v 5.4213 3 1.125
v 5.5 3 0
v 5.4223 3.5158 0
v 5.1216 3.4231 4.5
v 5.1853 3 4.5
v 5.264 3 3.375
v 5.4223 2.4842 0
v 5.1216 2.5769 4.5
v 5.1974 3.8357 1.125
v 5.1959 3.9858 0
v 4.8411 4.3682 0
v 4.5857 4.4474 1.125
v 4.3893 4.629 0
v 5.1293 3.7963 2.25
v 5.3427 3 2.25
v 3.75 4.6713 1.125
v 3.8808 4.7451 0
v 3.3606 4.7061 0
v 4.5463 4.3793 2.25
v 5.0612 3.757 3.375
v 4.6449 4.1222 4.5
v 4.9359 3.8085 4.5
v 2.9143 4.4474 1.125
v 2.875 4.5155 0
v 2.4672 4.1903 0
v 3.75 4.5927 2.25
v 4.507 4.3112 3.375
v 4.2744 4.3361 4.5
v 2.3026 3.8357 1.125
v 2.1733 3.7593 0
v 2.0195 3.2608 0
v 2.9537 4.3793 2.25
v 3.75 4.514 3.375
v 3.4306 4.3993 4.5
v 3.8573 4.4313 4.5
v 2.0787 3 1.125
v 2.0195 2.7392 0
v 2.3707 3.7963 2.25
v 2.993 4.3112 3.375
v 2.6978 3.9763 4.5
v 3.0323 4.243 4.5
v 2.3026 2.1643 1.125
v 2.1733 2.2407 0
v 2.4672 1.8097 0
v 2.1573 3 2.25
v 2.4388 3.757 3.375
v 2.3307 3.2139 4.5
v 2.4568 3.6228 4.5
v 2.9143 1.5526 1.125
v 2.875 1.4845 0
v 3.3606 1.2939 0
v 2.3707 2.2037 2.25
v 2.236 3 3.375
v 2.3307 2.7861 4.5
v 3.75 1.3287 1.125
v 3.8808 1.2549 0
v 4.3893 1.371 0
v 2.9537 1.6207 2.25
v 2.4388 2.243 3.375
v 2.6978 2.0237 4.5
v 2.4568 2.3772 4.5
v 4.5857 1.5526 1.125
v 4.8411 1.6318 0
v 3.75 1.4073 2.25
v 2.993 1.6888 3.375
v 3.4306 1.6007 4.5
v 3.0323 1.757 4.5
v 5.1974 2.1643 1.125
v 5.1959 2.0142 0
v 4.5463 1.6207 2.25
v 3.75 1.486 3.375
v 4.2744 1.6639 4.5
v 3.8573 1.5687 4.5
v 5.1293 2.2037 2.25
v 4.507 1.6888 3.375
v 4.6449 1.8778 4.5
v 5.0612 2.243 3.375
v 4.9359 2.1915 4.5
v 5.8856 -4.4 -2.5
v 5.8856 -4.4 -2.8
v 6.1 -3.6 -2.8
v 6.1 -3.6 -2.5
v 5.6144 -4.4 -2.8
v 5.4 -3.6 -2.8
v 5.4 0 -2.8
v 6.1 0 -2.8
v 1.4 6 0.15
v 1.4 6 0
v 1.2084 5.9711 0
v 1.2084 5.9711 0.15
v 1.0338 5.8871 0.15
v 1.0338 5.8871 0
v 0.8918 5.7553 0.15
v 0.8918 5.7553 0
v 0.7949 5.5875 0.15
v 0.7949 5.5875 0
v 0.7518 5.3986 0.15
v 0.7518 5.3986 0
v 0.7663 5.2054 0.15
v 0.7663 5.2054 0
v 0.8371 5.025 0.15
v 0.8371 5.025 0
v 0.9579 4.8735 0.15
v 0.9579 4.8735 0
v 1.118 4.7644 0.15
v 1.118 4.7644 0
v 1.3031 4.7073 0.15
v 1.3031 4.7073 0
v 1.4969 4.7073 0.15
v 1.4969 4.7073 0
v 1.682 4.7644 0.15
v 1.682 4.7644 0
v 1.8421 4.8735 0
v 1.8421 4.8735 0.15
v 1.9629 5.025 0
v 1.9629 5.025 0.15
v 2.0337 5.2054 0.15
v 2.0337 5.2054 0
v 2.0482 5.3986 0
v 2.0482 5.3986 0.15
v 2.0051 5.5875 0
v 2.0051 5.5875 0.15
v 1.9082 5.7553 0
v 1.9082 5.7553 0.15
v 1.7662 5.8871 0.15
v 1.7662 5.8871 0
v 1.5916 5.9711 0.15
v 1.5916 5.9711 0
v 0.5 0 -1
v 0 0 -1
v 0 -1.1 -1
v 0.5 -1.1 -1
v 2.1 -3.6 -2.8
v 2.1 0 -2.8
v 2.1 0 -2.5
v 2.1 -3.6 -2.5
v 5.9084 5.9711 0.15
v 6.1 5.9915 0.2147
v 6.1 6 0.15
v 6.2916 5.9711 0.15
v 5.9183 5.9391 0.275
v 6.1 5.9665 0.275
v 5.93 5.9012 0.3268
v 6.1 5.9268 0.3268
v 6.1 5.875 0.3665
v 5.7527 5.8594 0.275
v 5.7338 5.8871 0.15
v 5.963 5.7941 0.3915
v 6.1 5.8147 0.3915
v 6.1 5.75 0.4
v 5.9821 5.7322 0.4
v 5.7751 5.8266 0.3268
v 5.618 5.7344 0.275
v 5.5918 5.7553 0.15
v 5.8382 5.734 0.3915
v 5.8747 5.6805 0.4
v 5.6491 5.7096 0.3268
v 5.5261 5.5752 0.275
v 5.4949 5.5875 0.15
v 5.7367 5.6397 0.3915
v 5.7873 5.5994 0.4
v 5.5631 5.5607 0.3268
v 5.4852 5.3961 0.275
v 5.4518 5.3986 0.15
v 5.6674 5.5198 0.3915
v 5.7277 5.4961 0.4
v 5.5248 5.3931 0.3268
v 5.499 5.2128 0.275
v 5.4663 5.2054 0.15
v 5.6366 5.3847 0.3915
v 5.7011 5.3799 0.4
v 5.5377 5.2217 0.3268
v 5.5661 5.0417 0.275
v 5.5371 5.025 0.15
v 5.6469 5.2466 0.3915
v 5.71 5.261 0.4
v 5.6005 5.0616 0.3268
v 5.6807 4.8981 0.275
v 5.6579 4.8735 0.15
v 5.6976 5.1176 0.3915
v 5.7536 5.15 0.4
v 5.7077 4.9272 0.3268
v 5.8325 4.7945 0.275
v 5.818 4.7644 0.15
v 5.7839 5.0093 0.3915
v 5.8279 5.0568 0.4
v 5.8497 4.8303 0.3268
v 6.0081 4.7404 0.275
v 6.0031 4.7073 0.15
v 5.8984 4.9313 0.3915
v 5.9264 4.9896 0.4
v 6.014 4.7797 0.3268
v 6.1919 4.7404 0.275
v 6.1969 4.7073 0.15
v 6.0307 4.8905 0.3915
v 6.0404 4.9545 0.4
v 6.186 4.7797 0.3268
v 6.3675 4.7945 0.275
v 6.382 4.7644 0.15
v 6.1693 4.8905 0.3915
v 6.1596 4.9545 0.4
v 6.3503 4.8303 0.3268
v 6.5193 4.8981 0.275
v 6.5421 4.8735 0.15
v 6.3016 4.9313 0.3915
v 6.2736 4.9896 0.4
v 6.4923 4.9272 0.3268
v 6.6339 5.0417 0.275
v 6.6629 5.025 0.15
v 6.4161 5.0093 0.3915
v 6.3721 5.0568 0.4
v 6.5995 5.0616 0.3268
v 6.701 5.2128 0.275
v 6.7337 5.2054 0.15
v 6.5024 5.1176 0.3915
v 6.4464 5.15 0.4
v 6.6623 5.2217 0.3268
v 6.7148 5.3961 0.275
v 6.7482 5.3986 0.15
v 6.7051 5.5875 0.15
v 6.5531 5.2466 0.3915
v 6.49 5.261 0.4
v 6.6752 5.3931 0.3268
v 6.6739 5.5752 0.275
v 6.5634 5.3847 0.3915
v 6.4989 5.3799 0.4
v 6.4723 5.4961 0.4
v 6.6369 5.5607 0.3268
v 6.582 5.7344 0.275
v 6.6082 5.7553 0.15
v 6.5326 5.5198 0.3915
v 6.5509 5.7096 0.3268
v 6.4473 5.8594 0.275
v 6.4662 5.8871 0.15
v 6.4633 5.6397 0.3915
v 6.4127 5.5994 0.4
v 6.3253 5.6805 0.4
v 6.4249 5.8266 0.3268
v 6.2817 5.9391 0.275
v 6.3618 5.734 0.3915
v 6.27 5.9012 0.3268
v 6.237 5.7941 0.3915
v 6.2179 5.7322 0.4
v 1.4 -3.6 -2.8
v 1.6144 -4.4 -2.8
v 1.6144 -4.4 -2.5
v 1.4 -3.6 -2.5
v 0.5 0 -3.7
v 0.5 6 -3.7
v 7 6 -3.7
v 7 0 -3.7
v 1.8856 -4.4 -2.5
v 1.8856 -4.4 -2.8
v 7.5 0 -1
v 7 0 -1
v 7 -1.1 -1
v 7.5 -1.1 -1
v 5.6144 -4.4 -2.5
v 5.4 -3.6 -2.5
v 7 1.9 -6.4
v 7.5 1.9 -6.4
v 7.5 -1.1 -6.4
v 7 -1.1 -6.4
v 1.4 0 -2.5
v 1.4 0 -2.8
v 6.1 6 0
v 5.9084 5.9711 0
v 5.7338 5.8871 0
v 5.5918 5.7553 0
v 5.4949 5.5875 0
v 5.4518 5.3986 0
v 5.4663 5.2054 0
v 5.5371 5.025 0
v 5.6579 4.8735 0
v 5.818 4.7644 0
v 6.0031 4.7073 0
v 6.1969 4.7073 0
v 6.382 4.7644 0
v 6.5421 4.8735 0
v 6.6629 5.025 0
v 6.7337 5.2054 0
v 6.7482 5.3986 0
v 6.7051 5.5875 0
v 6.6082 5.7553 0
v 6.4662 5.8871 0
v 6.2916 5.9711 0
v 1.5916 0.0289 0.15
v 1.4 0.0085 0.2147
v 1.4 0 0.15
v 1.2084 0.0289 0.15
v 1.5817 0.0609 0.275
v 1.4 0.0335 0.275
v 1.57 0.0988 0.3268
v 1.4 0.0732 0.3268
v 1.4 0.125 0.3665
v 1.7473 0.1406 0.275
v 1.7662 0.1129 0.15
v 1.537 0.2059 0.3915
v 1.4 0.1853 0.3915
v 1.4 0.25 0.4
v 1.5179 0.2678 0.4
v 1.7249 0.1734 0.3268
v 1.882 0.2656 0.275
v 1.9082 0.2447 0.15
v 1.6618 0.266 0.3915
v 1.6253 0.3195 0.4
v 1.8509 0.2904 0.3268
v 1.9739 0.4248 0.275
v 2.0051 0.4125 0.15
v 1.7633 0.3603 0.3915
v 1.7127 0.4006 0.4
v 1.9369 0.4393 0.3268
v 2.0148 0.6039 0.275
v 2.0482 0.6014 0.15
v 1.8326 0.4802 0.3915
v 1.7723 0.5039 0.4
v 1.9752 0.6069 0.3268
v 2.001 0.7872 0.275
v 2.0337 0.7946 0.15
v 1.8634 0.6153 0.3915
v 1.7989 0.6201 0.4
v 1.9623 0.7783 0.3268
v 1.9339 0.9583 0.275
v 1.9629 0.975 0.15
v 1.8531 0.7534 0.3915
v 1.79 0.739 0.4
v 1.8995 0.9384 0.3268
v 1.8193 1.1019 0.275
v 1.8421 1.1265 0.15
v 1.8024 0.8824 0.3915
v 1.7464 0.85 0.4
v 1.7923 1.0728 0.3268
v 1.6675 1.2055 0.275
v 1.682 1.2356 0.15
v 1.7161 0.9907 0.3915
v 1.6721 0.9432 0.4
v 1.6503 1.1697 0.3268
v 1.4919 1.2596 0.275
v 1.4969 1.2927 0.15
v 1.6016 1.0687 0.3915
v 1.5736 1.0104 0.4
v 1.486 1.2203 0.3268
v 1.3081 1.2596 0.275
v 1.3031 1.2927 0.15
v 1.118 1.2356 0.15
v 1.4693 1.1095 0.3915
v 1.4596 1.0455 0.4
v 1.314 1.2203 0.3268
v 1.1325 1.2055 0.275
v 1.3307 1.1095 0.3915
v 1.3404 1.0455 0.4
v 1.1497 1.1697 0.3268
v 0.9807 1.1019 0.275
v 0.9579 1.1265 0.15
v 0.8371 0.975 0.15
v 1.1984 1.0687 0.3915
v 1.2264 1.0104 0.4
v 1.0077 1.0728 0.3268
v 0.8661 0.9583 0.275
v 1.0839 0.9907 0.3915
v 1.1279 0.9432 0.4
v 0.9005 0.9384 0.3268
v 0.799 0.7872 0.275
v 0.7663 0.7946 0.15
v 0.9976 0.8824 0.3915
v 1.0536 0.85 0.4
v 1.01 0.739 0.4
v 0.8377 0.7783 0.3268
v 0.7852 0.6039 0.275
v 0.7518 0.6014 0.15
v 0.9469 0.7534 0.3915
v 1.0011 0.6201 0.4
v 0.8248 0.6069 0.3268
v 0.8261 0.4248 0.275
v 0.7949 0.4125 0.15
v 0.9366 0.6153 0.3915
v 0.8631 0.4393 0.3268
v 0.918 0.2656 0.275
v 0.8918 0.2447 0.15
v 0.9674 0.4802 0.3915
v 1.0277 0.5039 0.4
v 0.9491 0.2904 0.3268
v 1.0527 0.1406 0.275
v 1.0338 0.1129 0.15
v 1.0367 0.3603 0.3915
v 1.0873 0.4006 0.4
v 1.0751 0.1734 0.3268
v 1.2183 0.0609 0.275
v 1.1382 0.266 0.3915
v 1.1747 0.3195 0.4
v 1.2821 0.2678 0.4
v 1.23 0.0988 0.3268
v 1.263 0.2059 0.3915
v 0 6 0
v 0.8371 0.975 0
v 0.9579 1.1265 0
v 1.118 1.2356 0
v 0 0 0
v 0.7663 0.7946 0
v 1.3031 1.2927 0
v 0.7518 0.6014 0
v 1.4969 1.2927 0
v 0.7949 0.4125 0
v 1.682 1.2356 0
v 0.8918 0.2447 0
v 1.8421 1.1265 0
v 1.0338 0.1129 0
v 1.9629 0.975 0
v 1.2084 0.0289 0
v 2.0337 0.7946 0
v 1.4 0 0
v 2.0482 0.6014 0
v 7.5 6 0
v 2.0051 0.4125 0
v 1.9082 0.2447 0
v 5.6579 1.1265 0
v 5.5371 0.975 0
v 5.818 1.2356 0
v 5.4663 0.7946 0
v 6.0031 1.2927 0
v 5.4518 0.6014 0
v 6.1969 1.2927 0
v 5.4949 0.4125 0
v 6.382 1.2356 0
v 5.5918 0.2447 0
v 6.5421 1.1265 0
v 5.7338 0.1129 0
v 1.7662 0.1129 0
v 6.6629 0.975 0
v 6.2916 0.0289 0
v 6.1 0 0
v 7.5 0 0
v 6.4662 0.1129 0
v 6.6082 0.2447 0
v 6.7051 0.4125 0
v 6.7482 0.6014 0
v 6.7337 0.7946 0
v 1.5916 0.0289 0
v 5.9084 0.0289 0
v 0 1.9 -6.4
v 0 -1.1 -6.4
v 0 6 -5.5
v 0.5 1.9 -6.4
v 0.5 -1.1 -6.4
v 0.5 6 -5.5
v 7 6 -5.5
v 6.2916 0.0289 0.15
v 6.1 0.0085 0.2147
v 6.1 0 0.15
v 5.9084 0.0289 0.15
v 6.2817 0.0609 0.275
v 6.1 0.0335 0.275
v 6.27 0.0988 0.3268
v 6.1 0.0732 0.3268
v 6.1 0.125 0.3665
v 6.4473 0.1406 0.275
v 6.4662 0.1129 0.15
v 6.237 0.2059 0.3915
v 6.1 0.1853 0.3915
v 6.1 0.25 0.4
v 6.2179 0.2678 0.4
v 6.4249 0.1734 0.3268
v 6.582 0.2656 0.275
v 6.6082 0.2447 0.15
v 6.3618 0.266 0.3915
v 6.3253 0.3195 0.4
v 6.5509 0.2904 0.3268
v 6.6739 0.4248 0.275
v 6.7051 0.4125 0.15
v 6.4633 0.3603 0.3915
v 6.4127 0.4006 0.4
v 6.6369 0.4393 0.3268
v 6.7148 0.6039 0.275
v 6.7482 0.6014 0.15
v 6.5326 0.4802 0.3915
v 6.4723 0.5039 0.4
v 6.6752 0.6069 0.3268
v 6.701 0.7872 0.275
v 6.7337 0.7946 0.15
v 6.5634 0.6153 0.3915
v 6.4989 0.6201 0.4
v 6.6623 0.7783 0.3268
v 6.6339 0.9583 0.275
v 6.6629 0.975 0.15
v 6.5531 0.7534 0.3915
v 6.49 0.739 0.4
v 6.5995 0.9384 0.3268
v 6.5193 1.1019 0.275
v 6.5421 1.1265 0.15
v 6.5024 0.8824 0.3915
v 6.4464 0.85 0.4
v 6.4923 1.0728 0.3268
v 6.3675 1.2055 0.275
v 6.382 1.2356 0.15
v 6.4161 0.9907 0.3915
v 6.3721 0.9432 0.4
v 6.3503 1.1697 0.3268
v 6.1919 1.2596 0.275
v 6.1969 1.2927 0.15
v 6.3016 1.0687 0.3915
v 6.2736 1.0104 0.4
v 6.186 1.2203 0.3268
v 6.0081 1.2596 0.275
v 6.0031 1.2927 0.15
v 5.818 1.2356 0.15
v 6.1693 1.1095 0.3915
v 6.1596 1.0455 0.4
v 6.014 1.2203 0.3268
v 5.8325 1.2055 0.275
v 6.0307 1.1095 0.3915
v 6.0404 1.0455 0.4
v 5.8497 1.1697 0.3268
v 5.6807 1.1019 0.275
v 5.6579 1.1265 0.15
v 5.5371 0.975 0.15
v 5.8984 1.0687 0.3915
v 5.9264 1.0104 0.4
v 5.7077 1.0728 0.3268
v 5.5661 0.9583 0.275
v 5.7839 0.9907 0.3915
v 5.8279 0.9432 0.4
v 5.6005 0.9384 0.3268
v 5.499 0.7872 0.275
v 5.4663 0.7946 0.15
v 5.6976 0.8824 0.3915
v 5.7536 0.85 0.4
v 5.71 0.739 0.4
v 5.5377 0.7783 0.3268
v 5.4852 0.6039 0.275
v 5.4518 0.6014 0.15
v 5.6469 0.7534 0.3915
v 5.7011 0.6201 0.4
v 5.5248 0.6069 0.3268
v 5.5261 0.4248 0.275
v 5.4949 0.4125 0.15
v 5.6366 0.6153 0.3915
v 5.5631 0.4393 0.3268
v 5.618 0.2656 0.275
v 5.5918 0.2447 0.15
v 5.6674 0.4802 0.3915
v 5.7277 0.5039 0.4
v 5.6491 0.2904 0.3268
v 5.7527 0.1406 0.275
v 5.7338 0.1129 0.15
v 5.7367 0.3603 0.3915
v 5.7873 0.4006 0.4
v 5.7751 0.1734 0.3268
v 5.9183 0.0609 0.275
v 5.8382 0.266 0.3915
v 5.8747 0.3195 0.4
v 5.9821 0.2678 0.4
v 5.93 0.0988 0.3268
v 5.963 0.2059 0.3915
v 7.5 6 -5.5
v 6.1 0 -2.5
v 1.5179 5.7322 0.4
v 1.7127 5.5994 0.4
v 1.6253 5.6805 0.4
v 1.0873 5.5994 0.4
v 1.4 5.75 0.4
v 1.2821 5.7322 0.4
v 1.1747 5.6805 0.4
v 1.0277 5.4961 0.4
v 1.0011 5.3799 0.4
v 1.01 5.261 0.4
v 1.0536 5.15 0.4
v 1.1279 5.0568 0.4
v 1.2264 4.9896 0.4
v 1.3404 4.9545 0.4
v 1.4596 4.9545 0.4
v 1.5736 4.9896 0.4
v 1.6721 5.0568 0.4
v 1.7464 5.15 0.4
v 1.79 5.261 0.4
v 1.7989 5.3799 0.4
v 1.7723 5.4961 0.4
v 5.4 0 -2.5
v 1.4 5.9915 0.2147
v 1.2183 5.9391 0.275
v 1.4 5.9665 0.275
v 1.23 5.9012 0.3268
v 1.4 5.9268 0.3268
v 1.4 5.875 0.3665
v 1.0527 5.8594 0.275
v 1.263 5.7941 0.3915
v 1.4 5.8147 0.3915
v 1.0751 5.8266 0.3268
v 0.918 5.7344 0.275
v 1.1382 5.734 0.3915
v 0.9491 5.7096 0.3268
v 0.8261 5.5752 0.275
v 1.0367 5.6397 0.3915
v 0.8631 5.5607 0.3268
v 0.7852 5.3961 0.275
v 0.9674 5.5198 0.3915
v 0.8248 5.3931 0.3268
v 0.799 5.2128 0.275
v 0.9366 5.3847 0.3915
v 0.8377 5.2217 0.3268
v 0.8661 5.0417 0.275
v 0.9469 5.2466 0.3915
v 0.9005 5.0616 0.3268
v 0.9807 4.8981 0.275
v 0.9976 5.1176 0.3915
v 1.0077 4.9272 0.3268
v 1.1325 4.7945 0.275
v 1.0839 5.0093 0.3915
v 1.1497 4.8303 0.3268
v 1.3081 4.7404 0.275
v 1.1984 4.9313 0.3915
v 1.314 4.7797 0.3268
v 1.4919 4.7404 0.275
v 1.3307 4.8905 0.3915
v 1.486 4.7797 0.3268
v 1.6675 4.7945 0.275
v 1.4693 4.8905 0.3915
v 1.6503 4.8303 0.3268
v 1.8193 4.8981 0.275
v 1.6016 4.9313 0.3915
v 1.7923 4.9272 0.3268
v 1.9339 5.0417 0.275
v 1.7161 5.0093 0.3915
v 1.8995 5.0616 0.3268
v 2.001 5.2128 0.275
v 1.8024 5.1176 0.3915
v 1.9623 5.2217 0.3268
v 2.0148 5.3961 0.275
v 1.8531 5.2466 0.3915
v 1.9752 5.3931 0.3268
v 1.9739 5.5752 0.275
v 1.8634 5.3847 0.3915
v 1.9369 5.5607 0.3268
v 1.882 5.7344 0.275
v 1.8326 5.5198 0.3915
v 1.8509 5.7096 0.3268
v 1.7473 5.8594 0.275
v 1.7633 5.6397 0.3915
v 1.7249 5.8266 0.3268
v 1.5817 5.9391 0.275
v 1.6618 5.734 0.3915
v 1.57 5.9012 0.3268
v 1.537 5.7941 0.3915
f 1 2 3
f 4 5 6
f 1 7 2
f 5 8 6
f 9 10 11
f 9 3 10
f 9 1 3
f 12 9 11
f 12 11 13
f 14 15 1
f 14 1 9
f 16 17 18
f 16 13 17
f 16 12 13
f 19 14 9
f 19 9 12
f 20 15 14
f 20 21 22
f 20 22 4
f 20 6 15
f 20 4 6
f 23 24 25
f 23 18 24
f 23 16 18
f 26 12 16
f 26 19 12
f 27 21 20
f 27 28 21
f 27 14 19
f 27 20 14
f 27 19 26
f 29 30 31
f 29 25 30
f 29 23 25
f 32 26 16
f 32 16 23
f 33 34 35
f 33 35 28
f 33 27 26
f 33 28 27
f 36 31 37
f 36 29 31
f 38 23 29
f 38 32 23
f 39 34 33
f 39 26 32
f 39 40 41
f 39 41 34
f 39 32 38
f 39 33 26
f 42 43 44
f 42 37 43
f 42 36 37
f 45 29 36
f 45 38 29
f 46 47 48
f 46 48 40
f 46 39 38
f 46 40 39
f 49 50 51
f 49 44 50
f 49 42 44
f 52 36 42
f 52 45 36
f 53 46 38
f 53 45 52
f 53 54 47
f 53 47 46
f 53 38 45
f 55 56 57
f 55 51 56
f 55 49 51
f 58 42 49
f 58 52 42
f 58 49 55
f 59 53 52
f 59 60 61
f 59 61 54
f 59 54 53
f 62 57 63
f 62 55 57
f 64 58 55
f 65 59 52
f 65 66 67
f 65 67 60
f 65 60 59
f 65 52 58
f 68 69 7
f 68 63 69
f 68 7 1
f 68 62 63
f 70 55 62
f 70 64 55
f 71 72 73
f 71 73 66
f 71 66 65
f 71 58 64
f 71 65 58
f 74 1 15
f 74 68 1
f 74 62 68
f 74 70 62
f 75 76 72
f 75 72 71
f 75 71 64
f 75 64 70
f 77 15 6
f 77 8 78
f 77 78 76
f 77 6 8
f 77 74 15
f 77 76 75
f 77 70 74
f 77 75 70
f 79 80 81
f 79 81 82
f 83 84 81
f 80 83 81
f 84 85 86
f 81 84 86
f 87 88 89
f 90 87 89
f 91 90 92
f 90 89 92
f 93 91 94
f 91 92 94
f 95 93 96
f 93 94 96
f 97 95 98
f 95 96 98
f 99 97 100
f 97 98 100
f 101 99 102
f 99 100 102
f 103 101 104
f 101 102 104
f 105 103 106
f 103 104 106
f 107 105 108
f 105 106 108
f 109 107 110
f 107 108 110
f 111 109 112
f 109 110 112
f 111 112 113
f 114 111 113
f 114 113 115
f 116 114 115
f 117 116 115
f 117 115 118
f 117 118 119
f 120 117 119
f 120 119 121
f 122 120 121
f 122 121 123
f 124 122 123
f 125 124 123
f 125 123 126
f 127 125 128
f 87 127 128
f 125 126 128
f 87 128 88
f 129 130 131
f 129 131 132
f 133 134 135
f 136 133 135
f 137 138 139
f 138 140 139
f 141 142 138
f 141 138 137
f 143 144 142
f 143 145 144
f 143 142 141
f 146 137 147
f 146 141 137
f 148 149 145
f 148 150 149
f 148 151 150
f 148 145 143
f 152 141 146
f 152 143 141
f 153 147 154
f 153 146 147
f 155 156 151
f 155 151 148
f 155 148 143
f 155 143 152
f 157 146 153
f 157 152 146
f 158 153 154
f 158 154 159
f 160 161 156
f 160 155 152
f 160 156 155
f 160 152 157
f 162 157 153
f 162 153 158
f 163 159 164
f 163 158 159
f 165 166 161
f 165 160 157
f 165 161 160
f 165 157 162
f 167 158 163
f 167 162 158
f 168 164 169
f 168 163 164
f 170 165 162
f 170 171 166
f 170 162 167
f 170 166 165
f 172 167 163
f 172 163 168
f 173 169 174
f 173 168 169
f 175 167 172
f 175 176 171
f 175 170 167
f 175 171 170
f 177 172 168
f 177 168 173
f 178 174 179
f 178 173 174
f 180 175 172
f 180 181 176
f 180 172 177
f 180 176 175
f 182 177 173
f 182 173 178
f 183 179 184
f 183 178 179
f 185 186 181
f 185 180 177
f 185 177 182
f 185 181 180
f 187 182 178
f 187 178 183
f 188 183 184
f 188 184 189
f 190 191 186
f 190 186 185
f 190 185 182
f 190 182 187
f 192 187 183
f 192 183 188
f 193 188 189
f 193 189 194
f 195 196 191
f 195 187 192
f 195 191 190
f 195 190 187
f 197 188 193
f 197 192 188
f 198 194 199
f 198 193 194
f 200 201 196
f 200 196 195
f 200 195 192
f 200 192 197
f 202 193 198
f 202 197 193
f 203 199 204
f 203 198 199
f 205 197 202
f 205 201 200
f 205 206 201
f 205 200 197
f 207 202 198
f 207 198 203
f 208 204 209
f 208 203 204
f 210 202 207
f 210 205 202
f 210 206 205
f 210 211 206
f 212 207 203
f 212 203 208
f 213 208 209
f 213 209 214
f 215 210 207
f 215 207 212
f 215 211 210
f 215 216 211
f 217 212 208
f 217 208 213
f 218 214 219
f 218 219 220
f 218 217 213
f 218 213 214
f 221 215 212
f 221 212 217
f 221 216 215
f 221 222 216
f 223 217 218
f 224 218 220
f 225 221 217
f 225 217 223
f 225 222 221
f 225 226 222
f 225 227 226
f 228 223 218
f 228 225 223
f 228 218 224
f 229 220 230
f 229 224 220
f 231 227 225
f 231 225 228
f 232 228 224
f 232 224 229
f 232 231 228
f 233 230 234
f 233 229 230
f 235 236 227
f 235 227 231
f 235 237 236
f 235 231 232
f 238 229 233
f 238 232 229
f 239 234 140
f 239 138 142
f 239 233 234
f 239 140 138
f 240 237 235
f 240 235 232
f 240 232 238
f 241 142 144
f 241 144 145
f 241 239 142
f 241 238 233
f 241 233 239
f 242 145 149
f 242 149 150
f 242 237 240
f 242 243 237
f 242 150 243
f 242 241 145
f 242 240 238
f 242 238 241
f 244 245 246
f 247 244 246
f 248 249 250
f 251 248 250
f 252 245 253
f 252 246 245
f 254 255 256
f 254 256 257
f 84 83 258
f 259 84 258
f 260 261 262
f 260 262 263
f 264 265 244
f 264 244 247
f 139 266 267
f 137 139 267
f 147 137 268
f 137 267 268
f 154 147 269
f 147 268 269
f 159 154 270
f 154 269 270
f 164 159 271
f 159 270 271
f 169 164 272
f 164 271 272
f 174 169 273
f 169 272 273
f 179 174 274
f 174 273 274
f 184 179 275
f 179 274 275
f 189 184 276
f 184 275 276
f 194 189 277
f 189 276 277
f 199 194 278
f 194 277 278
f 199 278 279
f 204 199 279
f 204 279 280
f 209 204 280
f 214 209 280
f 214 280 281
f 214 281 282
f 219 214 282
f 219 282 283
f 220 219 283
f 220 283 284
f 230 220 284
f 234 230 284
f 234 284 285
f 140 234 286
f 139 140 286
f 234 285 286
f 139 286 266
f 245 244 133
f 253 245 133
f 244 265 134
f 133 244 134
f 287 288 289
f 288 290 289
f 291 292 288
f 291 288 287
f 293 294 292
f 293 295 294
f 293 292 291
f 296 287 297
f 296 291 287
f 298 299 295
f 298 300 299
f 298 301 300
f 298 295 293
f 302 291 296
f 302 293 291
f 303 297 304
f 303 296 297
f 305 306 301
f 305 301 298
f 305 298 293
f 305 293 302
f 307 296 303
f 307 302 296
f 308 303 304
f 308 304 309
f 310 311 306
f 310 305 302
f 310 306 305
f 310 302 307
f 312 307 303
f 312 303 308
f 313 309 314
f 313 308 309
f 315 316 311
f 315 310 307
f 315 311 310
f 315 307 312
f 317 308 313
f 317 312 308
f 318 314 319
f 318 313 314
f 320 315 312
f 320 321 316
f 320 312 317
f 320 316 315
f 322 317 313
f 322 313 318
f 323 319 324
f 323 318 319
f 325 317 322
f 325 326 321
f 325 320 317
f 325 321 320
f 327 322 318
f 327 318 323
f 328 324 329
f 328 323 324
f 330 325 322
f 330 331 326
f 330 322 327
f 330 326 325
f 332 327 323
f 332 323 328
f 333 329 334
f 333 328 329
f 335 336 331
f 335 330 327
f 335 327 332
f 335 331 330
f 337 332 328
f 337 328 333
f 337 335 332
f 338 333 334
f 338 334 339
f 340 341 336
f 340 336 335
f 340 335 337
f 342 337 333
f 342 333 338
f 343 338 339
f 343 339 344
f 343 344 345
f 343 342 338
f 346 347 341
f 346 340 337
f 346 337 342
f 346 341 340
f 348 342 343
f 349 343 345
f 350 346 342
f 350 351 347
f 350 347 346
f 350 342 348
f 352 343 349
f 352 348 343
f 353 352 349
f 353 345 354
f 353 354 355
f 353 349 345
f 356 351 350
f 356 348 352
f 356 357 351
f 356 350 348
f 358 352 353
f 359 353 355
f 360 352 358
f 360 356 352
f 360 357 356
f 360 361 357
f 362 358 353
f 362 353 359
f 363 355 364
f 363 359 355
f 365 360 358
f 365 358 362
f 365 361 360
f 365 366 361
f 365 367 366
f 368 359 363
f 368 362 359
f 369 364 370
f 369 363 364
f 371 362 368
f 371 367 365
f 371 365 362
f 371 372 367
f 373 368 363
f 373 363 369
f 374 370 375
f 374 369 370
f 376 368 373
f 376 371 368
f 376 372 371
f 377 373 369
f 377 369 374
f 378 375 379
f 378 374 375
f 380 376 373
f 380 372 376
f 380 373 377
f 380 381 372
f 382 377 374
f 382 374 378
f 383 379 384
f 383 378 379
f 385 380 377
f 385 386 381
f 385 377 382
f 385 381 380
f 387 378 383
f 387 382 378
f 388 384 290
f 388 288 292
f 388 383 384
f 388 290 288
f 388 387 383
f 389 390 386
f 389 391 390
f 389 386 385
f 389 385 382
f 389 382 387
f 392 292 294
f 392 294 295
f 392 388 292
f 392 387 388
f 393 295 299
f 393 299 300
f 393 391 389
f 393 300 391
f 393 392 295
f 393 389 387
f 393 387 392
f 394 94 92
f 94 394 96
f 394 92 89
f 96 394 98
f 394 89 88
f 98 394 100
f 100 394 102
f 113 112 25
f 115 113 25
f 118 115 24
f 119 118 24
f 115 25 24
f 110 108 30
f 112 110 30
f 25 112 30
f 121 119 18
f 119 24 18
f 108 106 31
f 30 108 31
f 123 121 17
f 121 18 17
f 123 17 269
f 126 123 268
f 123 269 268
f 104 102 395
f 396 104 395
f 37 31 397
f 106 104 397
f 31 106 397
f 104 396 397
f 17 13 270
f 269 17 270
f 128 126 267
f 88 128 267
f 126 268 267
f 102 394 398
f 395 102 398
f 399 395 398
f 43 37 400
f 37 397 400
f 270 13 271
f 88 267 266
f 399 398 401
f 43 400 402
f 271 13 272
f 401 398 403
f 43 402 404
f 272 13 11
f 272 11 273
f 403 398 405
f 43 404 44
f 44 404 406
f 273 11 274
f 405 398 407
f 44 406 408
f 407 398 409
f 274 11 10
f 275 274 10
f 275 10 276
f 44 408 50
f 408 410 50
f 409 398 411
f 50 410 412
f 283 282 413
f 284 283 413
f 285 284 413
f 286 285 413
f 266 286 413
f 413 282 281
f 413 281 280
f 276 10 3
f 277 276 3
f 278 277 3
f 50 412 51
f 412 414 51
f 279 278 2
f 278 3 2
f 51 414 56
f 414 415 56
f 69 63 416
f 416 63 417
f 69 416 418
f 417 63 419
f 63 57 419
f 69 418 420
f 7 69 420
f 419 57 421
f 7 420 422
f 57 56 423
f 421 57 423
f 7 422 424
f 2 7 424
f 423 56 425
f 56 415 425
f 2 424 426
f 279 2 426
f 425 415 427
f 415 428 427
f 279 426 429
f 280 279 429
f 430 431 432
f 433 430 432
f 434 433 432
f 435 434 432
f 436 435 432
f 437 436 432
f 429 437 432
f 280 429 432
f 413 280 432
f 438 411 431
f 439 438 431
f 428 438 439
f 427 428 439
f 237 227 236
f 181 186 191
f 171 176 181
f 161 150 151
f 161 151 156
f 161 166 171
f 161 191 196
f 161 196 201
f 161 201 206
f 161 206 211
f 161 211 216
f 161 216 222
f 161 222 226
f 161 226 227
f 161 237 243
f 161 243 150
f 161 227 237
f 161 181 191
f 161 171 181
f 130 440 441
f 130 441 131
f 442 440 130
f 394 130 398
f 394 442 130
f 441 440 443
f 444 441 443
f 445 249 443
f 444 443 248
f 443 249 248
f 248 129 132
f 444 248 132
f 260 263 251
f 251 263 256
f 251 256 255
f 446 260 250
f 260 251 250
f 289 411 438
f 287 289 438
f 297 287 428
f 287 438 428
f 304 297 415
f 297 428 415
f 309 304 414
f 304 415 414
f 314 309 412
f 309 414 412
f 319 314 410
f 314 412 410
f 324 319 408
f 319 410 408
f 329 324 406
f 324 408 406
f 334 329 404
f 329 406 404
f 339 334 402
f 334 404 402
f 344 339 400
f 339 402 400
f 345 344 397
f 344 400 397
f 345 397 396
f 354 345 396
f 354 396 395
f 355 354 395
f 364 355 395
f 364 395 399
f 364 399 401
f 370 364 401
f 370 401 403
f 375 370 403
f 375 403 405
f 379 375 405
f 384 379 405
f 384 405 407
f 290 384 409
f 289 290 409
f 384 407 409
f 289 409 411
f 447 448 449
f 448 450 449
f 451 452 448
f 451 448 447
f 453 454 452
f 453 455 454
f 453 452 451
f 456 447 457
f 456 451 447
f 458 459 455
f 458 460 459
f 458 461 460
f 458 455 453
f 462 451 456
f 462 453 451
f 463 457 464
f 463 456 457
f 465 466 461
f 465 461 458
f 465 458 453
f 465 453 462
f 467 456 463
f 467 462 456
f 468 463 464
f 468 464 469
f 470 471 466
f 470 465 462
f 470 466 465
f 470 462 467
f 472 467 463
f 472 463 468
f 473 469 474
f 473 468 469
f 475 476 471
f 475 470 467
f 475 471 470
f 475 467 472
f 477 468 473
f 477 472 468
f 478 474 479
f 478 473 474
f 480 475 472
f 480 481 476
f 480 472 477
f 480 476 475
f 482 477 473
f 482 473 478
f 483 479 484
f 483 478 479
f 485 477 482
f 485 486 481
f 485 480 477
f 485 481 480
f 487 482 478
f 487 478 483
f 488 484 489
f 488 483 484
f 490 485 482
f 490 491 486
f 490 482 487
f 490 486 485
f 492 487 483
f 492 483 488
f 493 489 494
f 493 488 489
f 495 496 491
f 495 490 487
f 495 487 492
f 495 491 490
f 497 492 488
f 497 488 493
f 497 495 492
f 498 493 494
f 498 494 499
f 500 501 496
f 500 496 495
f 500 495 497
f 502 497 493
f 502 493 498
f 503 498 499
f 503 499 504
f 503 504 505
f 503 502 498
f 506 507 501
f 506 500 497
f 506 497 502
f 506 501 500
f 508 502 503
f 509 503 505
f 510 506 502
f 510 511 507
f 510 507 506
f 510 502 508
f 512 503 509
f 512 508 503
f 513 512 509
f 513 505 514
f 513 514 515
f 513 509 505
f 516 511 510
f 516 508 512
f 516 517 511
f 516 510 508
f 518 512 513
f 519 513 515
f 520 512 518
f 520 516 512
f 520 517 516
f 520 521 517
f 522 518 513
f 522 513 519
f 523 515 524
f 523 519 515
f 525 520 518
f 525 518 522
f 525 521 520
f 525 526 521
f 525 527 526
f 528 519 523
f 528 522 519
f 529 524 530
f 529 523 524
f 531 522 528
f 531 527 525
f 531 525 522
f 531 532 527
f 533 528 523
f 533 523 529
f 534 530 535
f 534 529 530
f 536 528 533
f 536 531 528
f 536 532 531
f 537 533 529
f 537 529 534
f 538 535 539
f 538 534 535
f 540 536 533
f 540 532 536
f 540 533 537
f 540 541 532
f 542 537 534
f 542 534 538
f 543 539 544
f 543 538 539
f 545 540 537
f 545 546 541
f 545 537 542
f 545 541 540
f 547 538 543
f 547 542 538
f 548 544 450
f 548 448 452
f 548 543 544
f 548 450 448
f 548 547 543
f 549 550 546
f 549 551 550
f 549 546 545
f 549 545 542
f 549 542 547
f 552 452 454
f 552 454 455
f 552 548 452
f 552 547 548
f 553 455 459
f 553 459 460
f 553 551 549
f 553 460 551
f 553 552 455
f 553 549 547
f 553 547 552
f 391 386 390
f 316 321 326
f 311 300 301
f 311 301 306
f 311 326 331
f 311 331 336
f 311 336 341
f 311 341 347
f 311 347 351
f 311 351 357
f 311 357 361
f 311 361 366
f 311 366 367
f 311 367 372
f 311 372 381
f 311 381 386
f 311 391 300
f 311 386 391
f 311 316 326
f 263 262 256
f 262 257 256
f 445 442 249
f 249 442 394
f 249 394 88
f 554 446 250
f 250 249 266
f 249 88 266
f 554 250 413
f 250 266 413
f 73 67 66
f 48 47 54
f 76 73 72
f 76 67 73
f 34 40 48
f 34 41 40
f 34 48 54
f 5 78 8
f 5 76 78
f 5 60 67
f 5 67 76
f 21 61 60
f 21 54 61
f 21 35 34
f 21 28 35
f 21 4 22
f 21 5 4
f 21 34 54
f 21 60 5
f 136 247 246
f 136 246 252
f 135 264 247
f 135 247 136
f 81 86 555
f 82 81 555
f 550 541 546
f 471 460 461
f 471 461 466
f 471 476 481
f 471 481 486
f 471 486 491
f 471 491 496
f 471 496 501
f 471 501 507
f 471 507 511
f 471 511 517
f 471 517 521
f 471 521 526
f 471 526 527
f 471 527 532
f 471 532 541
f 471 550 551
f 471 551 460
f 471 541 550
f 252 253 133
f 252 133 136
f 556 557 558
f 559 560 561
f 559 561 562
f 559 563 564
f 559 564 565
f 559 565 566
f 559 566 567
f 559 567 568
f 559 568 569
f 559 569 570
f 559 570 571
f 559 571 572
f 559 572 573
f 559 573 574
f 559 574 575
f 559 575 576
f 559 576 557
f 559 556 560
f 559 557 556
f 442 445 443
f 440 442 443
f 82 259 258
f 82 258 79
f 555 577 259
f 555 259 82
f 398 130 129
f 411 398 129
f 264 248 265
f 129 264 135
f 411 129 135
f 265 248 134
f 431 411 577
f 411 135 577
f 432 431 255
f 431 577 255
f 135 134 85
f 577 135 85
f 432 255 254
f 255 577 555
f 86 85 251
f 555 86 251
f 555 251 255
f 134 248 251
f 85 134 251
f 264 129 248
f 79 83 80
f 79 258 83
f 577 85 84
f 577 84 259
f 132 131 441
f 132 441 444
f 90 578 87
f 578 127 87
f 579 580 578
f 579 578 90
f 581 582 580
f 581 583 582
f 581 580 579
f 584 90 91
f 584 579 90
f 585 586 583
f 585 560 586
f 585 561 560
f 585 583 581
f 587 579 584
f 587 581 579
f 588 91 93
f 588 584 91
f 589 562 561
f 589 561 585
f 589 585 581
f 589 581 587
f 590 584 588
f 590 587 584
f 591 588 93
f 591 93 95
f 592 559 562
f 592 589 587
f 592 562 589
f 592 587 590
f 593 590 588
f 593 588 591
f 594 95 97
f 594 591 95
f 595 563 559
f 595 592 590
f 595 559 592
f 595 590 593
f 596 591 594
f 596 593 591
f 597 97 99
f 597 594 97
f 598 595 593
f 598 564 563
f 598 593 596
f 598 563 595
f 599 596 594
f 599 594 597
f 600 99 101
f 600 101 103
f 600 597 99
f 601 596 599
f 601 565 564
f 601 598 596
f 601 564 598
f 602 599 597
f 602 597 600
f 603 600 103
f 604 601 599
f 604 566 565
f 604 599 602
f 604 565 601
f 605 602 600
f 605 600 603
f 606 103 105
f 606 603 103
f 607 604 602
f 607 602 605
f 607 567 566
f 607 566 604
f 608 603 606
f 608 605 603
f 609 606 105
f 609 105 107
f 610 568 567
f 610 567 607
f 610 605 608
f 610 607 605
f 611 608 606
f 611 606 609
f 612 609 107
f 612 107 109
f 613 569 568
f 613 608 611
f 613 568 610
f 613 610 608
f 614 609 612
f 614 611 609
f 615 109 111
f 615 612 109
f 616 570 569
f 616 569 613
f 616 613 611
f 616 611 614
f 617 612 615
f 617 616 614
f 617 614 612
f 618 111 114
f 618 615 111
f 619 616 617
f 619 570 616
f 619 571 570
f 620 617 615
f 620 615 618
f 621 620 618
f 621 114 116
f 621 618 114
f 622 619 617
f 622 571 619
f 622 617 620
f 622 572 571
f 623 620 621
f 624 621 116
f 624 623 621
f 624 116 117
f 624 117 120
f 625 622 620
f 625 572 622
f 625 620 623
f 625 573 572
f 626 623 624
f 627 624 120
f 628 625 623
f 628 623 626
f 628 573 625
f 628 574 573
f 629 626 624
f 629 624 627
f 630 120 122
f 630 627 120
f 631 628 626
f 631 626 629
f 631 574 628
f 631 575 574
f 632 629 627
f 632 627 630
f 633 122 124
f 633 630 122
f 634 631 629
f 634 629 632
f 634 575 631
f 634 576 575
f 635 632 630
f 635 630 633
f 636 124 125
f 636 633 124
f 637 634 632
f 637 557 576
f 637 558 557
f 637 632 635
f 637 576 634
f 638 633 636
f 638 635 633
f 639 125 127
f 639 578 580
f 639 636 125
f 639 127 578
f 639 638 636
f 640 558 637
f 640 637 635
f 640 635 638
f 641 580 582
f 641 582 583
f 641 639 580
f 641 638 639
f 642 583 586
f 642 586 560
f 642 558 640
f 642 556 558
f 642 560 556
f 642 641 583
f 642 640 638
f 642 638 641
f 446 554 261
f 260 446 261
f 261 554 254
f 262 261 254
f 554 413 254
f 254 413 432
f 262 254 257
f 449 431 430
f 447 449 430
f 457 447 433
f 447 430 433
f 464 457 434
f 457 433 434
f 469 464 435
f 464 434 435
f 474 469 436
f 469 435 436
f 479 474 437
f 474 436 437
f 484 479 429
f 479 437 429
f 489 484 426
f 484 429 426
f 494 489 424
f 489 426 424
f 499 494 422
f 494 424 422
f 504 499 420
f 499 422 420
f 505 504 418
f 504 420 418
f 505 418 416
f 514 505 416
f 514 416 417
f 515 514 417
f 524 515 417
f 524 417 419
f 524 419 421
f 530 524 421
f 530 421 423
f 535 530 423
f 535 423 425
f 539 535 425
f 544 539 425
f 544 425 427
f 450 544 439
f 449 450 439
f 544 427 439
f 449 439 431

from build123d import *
from OCP.BRepFilletAPI import BRepFilletAPI_MakeChamfer

# Parameters (mm, degrees)
SKETCH1_W           = 7.5
SKETCH1_H           = 3.7
BOSS_EXTRUDE1_DEPTH = 6
SKETCH2_R           = 1.75
BOSS_EXTRUDE2_DEPTH = 4.5
BOSS_EXTRUDE2_TAPER = 4
SKETCH3_W           = 0.7
SKETCH3_H           = 0.3
BOSS_EXTRUDE3_DEPTH = 4.4
SKETCH4_W           = 0.5
SKETCH4_H           = 2.7
BOSS_EXTRUDE4_DEPTH = 1.1
BOSS_EXTRUDE5_DEPTH = 2.7
CUT_EXTRUDE1_DEPTH  = 12.541663658
SKETCH7_R           = 0.65
BOSS_EXTRUDE6_DEPTH = 0.4
FILLET1_R           = 0.25
CHAMFER1_SIZE       = 0.8
CHAMFER1_SIZE2      = 0.214359354


with BuildPart() as part:
    # Sketch1 → Boss-Extrude1 (new body)
    with BuildSketch(Plane(origin=(0, 0, 0), x_dir=(1, 0, 0), z_dir=(0, 1, 0))):
        with Locations((3.75, 1.85)):
            Rectangle(SKETCH1_W, SKETCH1_H)
    extrude(amount=BOSS_EXTRUDE1_DEPTH)

    # Sketch2 → Boss-Extrude2 (add)
    with BuildSketch(Plane.XY):
        with Locations((3.75, 3)):
            Circle(SKETCH2_R)
    extrude(amount=BOSS_EXTRUDE2_DEPTH, taper=BOSS_EXTRUDE2_TAPER)

    # Sketch3 → Boss-Extrude3 (add)
    with BuildSketch(Plane.XZ):
        with Locations((1.75, -2.65)):
            Rectangle(SKETCH3_W, SKETCH3_H)
        with Locations((5.75, -2.65)):
            Rectangle(SKETCH3_W, SKETCH3_H)
    extrude(amount=BOSS_EXTRUDE3_DEPTH)

    # Sketch4 → Boss-Extrude4 (add)
    with BuildSketch(Plane.XZ):
        with Locations((0.25, -2.35)):
            Rectangle(SKETCH4_W, SKETCH4_H)
        with Locations((7.25, -2.35)):
            Rectangle(SKETCH4_W, SKETCH4_H)
    extrude(amount=BOSS_EXTRUDE4_DEPTH)

    # Sketch5 → Boss-Extrude5 (add)
    with BuildSketch(Plane(origin=(0, 0, -3.7), x_dir=(-1, 0, 0), z_dir=(0, 0, -1))):
        Polygon((-7, 0), (-7, 6), (-7.5, 6), (-7.5, -1.1), (-7, -1.1), align=None)
        Polygon((-0.5, -1.1), (-0.5, 0), (-0.5, 6), (0, 6), (0, -1.1), align=None)
    extrude(amount=BOSS_EXTRUDE5_DEPTH)

    # Sketch6 → Cut-Extrude1 (cut, through all)
    with BuildSketch(Plane(origin=(7.5, 0, 0), x_dir=(0, 0, -1), z_dir=(1, 0, 0))):
        Polygon((5.5, 6), (6.4, 1.9), (6.4, 6), align=None)
    extrude(amount=-CUT_EXTRUDE1_DEPTH, mode=Mode.SUBTRACT)

    # Sketch7 → Boss-Extrude6 (add)
    with BuildSketch(Plane.XY):
        with Locations(Location((1.4, 5.35, 0), (0, 0, 90))):
            Circle(SKETCH7_R)
        with Locations(Location((6.1, 5.35, 0), (0, 0, 90))):
            Circle(SKETCH7_R)
        with Locations(Location((6.1, 0.65, 0), (0, 0, 270))):
            Circle(SKETCH7_R)
        with Locations(Location((1.4, 0.65, 0), (0, 0, 270))):
            Circle(SKETCH7_R)
    extrude(amount=BOSS_EXTRUDE6_DEPTH)

    # Fillet1
    fillet1_edges = [part.edges().sort_by_distance(p)[0] for p in [
        (1.4, 4.7, 0.4),
        (6.1, 4.7, 0.4),
        (6.1, 1.3, 0.4),
        (1.4, 1.3, 0.4),
    ]]
    fillet(fillet1_edges, radius=FILLET1_R)

    # Chamfer1: one chamfer whose edges measure the first distance from different faces: ONE call of the kernel's chamfer builder (chamfer() names one face for all edges)
    chamfer1_edges_1 = [part.edges().sort_by_distance(p)[0] for p in [
        (1.4, -4.4, -2.65),
    ]]
    chamfer1_side_1 = [part.faces().sort_by_distance(p)[0] for p in [
        (1.4, -2.2, -2.65),
    ]]
    chamfer1_edges_2 = [part.edges().sort_by_distance(p)[0] for p in [
        (2.1, -4.4, -2.65),
    ]]
    chamfer1_side_2 = [part.faces().sort_by_distance(p)[0] for p in [
        (2.1, -2.2, -2.65),
    ]]
    chamfer1_edges_3 = [part.edges().sort_by_distance(p)[0] for p in [
        (5.4, -4.4, -2.65),
    ]]
    chamfer1_side_3 = [part.faces().sort_by_distance(p)[0] for p in [
        (5.4, -2.2, -2.65),
    ]]
    chamfer1_edges_4 = [part.edges().sort_by_distance(p)[0] for p in [
        (6.1, -4.4, -2.65),
    ]]
    chamfer1_side_4 = [part.faces().sort_by_distance(p)[0] for p in [
        (6.1, -2.2, -2.65),
    ]]
    chamfer1 = BRepFilletAPI_MakeChamfer(part.part.solid().wrapped)
    for e in chamfer1_edges_1:
        chamfer1.Add(CHAMFER1_SIZE, CHAMFER1_SIZE2, e.wrapped, chamfer1_side_1[0].wrapped)  # the first distance lies on this face
    for e in chamfer1_edges_2:
        chamfer1.Add(CHAMFER1_SIZE, CHAMFER1_SIZE2, e.wrapped, chamfer1_side_2[0].wrapped)  # the first distance lies on this face
    for e in chamfer1_edges_3:
        chamfer1.Add(CHAMFER1_SIZE, CHAMFER1_SIZE2, e.wrapped, chamfer1_side_3[0].wrapped)  # the first distance lies on this face
    for e in chamfer1_edges_4:
        chamfer1.Add(CHAMFER1_SIZE, CHAMFER1_SIZE2, e.wrapped, chamfer1_side_4[0].wrapped)  # the first distance lies on this face
    add(Compound.cast(chamfer1.Shape()), mode=Mode.REPLACE)


solid = part.part
